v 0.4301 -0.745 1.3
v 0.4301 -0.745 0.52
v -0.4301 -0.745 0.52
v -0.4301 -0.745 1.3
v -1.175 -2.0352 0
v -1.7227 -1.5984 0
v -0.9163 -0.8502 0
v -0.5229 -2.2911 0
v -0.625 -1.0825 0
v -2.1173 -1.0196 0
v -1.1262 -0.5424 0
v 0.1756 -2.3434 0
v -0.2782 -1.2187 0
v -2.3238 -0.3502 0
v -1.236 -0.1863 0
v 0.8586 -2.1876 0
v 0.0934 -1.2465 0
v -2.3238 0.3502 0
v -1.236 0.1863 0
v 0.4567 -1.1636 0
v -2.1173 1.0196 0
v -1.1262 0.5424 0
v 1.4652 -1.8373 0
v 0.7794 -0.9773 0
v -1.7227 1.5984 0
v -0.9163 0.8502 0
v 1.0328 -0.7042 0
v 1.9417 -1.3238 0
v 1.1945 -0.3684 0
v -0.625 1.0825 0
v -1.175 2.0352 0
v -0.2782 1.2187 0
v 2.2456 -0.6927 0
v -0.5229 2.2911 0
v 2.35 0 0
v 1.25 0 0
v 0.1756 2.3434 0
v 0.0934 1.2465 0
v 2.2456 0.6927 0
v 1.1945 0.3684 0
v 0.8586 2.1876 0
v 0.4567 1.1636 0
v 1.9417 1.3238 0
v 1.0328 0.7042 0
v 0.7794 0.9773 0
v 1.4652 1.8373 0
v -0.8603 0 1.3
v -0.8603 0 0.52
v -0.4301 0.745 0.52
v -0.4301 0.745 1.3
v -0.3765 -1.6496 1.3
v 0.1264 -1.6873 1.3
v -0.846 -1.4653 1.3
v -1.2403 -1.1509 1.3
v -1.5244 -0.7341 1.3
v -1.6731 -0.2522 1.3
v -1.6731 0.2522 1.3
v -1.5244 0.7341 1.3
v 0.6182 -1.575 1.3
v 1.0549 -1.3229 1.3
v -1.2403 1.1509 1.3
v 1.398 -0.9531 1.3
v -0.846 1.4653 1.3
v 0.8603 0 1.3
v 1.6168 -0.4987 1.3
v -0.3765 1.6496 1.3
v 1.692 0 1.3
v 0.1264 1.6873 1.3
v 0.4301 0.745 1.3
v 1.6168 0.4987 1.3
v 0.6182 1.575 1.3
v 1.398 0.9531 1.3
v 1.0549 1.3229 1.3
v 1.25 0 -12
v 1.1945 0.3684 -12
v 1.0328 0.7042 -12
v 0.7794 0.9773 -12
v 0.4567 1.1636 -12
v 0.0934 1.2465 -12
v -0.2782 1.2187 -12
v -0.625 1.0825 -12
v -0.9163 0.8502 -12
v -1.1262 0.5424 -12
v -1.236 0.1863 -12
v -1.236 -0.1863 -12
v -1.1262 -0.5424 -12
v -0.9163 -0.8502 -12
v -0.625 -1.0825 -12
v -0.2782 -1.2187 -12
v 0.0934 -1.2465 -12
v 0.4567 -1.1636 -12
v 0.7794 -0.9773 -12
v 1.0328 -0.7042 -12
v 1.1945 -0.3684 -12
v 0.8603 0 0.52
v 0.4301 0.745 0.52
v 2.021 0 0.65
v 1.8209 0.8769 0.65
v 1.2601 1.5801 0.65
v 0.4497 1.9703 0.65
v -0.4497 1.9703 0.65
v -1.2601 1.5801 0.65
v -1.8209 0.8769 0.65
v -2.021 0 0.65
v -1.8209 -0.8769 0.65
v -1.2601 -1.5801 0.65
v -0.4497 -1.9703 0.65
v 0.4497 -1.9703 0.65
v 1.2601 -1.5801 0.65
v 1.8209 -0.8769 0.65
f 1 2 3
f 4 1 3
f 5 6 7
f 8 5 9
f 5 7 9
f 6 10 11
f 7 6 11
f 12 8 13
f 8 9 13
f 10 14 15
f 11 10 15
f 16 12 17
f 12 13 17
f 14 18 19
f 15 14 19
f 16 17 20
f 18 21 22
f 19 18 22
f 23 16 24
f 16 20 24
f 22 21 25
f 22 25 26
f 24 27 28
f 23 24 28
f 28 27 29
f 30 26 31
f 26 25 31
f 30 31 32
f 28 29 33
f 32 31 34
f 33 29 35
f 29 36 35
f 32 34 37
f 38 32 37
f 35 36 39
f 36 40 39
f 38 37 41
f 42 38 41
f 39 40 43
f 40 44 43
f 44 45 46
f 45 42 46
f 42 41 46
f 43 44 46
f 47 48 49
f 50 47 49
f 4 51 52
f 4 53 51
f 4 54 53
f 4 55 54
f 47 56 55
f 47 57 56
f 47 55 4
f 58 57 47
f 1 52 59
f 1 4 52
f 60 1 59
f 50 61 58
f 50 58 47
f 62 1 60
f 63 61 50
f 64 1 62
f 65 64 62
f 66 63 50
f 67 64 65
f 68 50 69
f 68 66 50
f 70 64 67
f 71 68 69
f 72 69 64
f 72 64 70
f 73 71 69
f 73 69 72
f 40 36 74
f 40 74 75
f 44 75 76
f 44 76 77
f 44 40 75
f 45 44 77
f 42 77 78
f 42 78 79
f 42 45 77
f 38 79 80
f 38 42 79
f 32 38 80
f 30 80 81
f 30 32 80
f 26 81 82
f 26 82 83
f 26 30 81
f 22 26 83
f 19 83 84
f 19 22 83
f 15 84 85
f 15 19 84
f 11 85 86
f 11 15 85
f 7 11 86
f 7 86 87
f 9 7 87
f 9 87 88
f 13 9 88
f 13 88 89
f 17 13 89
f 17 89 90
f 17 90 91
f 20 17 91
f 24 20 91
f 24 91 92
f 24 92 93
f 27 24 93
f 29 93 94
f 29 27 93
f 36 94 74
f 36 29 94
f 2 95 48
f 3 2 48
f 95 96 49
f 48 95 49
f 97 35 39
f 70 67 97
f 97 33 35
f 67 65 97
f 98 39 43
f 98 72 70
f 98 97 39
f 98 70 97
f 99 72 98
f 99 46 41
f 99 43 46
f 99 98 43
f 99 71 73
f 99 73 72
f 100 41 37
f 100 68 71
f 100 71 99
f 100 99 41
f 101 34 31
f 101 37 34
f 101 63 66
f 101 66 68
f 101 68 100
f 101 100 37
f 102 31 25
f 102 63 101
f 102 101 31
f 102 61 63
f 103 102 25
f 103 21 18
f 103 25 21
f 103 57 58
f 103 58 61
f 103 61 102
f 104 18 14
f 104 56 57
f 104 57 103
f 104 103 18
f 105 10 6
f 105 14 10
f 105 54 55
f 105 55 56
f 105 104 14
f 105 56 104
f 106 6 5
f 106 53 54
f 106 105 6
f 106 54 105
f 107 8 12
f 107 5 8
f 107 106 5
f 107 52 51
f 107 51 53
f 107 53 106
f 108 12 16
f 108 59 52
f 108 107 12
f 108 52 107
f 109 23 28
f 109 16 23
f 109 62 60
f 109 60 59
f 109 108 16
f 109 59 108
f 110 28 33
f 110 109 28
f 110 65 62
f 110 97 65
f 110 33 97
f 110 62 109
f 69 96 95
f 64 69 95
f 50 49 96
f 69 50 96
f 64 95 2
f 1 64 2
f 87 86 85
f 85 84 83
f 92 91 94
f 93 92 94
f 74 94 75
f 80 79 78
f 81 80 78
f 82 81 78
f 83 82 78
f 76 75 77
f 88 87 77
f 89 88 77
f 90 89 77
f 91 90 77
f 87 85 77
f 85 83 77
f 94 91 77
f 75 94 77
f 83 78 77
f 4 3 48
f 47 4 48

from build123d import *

# Parameters (mm, degrees)
SK_SHANK_R   = 1.25
SHANK_DEPTH  = 12
SK_HEAD_R    = 2.35
HEAD_DEPTH   = 1.3
HEAD_TAPER   = 26.84642782
SOCKET_START = 0.52
SOCKET_DEPTH = 1.28


with BuildPart() as part:
    # SK_shank → Shank (new body)
    with BuildSketch(Plane.XY):
        Circle(SK_SHANK_R)
    extrude(amount=-SHANK_DEPTH)

    # SK_head → Head (add)
    with BuildSketch(Plane.XY):
        Circle(SK_HEAD_R)
    extrude(amount=HEAD_DEPTH, taper=HEAD_TAPER)

    # SK_socket → Socket (cut)
    with BuildSketch(Plane.XY.offset(SOCKET_START)):
        Polygon((0.860251901, 0), (0.430125951, -0.745), (-0.430125951, -0.745), (-0.860251901, 0), (-0.430125951, 0.745), (0.430125951, 0.745), align=None)
    extrude(amount=SOCKET_DEPTH, mode=Mode.SUBTRACT)


solid = part.part
